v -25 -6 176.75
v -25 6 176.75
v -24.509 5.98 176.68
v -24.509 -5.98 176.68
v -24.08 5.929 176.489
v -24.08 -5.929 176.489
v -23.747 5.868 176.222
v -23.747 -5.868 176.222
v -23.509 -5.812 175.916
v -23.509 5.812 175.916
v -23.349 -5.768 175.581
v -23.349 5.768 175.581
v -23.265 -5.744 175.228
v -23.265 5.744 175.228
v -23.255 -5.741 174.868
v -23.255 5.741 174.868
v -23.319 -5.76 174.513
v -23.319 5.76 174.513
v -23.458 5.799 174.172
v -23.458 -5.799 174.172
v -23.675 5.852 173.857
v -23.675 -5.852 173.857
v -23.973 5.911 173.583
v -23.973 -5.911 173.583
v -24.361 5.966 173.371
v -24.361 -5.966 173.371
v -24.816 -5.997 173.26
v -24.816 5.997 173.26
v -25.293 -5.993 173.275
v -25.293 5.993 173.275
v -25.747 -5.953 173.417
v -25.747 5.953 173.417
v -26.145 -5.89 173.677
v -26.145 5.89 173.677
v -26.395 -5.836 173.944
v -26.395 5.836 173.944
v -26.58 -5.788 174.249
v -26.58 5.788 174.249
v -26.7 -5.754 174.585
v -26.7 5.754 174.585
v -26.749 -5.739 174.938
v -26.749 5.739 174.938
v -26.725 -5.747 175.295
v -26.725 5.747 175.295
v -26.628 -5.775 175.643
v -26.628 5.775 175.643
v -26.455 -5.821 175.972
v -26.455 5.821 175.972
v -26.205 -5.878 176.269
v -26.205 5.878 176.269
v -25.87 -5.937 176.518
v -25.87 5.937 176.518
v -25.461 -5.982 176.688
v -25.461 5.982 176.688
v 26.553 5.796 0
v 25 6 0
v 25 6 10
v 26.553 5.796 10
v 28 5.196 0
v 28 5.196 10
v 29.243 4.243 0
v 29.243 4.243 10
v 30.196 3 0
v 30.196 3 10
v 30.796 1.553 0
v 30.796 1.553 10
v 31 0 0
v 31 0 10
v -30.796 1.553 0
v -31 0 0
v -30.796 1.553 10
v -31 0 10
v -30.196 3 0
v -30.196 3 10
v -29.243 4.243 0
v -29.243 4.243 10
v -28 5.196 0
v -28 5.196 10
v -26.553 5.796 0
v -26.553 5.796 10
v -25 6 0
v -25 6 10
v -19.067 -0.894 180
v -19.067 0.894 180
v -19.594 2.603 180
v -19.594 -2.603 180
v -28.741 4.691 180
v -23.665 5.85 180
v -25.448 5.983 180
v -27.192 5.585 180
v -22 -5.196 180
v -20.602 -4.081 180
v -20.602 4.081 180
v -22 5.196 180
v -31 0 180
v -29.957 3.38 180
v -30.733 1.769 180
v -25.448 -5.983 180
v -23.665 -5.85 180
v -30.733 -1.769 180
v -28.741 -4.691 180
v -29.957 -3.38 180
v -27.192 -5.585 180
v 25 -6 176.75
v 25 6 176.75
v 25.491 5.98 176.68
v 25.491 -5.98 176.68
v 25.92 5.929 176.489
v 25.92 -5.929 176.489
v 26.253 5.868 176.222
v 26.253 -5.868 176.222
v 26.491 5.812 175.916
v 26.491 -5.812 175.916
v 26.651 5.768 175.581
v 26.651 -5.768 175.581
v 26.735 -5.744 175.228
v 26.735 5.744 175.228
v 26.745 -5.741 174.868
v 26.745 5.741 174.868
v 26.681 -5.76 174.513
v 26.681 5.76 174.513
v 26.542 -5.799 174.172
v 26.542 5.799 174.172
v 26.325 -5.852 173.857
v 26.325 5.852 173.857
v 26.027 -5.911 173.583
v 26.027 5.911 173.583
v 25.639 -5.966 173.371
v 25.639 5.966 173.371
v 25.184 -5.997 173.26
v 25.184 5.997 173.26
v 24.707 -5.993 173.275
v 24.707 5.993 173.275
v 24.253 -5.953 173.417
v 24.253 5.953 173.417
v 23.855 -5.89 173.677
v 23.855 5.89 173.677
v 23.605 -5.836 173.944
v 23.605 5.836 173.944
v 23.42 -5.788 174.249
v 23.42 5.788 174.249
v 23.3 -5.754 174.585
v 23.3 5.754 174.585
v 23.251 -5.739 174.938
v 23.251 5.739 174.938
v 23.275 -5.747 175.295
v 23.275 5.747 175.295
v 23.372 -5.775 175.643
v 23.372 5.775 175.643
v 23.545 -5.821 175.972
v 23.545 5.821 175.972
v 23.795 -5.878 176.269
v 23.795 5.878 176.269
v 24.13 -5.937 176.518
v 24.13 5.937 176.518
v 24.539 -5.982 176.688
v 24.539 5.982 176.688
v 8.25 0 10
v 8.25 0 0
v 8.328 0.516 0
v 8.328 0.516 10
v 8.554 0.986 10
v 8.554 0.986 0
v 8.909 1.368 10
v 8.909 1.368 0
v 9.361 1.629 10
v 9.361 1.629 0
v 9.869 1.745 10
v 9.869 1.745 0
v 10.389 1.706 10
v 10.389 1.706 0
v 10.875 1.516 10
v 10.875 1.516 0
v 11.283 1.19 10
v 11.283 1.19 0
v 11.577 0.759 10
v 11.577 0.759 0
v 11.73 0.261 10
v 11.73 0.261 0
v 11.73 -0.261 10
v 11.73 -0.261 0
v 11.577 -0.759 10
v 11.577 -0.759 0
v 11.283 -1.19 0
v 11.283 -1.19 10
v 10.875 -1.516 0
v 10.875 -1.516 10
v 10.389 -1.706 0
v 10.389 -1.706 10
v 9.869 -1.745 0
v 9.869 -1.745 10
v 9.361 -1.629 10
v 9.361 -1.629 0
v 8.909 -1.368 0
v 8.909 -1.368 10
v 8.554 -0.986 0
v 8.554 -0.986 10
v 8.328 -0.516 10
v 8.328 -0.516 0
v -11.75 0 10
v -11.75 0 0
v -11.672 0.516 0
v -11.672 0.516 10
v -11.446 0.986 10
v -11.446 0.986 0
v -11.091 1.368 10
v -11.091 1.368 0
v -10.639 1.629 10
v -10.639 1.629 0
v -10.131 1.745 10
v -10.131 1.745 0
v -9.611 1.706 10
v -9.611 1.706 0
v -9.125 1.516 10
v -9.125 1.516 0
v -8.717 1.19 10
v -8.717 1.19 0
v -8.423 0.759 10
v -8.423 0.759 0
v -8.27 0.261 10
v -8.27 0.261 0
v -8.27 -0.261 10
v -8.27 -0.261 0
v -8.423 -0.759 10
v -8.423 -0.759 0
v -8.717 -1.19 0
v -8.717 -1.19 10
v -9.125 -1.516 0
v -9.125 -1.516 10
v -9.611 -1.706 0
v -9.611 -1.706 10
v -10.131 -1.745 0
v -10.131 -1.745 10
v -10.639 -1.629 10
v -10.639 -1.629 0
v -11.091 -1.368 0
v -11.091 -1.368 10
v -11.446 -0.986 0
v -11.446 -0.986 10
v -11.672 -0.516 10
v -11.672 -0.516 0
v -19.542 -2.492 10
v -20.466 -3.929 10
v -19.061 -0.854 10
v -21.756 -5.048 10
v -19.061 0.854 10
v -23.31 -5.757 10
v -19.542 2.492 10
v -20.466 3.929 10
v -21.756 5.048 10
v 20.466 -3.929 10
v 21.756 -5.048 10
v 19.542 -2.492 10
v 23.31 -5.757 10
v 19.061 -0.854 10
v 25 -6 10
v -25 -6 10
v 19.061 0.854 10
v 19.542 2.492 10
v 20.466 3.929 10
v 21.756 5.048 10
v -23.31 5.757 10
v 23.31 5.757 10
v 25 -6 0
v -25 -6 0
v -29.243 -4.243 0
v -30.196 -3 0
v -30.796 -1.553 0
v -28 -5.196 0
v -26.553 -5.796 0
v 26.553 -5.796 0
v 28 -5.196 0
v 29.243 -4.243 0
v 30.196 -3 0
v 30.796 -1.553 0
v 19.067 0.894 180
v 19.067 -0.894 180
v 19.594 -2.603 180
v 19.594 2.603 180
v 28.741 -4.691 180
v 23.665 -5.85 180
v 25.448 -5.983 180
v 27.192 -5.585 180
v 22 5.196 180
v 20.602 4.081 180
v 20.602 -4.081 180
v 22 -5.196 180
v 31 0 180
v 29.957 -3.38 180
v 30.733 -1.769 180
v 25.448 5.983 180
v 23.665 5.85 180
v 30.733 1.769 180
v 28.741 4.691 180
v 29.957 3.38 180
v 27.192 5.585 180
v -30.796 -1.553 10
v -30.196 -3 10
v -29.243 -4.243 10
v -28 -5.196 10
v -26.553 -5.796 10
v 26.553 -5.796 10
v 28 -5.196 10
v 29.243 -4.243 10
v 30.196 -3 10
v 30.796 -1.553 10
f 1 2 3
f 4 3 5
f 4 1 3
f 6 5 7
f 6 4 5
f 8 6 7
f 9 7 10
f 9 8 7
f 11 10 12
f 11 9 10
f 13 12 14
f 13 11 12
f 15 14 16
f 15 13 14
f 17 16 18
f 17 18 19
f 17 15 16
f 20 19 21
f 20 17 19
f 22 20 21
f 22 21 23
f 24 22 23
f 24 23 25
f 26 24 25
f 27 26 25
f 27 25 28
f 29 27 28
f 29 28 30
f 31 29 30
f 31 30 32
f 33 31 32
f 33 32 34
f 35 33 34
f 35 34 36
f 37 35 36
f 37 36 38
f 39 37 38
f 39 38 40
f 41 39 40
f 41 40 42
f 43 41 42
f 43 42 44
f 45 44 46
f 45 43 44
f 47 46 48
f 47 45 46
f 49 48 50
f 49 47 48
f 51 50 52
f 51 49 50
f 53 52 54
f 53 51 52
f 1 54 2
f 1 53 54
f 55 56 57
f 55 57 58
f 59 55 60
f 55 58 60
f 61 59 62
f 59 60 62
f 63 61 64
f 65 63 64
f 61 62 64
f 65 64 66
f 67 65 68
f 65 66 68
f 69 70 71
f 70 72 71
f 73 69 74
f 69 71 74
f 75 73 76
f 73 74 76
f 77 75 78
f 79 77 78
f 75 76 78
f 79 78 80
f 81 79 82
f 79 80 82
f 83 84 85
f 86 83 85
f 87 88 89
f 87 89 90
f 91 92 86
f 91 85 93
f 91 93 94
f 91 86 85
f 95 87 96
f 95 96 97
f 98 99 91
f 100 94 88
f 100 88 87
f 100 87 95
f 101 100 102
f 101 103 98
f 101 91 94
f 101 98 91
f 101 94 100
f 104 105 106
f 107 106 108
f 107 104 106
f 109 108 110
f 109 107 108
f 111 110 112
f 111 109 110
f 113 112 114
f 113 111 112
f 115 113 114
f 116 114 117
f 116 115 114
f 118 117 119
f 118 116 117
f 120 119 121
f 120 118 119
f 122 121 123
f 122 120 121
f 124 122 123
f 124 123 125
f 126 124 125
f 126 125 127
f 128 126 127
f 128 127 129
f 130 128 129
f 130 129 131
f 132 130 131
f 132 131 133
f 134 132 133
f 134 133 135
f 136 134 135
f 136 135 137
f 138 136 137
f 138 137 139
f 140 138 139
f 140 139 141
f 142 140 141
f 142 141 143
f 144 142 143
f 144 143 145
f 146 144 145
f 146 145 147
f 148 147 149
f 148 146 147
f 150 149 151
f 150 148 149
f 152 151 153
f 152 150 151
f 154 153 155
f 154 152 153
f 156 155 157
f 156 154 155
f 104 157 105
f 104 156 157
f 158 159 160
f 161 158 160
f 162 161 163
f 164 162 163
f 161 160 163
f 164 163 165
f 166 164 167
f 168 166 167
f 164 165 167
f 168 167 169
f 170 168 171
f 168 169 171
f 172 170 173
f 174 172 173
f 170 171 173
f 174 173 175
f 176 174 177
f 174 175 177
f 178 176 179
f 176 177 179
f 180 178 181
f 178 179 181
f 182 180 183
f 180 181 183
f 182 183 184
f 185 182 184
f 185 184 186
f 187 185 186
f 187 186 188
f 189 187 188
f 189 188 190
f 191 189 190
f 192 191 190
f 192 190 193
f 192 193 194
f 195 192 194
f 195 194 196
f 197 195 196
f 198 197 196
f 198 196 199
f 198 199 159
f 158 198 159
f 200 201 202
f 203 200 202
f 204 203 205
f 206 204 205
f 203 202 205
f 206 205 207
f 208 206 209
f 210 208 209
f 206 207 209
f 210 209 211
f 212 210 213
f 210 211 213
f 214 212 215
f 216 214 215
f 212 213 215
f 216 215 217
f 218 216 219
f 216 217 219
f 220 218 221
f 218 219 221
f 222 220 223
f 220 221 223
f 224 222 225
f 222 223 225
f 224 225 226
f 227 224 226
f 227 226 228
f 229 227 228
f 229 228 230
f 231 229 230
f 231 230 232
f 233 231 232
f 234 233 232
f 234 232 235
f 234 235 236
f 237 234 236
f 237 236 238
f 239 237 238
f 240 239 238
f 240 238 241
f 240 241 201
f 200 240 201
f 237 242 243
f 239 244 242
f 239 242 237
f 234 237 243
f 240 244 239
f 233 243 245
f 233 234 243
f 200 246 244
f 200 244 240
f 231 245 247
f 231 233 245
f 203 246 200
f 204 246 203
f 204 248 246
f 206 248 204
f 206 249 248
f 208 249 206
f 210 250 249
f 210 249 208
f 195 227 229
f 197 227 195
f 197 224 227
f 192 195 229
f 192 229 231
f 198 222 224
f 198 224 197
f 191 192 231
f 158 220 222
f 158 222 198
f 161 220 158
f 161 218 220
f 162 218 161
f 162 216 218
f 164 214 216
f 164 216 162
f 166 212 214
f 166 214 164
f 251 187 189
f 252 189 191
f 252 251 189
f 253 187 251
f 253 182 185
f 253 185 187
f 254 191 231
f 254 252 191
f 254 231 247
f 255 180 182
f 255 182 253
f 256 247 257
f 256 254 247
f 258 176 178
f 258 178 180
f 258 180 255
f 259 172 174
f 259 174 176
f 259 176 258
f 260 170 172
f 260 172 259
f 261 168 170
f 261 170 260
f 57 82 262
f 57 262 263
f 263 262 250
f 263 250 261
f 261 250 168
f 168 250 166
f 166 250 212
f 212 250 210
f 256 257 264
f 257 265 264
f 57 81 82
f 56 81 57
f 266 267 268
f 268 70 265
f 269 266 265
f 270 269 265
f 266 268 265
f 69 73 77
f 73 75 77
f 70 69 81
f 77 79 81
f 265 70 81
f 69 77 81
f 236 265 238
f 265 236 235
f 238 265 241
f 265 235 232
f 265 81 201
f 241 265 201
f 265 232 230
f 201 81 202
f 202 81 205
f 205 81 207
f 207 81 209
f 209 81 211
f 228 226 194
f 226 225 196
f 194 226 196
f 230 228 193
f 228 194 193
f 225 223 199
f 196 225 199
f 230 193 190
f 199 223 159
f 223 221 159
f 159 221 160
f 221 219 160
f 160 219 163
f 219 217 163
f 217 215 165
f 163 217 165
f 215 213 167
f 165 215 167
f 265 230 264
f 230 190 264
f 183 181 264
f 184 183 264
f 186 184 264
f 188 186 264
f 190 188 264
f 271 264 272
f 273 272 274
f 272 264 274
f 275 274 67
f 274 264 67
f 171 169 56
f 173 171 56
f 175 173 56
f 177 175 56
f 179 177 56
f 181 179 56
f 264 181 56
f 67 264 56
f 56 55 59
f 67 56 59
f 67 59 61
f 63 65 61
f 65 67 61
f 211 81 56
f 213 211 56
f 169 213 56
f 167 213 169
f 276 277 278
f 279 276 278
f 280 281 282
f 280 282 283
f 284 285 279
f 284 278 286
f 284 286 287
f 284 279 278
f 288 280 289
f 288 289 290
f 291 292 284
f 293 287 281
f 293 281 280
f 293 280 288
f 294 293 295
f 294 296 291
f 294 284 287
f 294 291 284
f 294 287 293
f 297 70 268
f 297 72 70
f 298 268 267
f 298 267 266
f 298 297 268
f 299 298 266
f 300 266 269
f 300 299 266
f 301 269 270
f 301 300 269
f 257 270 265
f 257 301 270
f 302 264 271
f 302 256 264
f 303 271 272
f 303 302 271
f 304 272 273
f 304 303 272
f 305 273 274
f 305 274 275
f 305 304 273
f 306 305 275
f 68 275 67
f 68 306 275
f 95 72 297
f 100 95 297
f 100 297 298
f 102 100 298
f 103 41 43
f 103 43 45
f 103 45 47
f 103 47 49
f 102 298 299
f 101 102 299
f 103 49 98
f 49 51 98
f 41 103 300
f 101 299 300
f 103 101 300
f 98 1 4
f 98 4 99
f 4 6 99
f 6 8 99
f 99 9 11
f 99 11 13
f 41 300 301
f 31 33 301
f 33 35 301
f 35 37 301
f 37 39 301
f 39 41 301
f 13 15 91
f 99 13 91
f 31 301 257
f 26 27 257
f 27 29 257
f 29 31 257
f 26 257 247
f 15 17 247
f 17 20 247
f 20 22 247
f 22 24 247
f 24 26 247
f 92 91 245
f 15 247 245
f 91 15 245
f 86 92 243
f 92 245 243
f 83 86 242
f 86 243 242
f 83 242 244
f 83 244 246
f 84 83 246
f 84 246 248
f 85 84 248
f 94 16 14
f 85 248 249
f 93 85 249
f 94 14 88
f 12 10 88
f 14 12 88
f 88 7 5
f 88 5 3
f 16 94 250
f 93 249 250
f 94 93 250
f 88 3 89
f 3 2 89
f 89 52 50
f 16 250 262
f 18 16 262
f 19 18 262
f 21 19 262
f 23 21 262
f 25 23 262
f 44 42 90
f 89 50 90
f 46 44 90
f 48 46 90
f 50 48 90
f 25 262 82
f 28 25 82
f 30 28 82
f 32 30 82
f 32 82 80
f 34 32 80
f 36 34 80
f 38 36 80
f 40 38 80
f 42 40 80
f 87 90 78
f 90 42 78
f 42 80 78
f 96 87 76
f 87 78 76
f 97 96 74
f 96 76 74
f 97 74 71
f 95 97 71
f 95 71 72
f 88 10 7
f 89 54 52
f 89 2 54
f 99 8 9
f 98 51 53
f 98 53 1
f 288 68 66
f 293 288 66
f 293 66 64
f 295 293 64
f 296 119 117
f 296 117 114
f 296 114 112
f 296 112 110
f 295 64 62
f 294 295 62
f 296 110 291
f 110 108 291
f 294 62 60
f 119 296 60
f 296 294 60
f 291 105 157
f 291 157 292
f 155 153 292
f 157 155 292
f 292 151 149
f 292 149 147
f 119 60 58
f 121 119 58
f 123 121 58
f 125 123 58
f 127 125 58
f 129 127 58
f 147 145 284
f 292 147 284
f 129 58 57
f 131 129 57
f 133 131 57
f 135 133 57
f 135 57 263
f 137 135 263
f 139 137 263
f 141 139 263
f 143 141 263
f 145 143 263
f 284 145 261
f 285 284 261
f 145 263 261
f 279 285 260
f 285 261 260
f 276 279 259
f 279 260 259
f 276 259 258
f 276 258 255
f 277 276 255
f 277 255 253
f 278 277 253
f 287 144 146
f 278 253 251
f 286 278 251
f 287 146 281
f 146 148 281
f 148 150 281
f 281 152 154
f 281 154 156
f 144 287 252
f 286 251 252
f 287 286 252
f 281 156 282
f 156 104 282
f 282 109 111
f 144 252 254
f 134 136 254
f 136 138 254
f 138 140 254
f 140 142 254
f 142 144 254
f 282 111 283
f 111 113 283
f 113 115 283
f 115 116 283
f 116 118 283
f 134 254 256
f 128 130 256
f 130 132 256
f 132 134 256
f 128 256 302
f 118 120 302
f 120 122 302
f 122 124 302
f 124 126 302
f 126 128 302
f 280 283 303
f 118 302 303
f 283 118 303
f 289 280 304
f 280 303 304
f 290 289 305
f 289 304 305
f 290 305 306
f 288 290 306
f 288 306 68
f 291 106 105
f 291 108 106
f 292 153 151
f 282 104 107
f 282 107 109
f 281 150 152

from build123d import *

# Parameters (mm, degrees)
SKETCH1_W               = 62
SKETCH1_H               = 12
BOSS_EXTRUDE1_DEPTH     = 10
SKETCH2_R               = 6
BOSS_EXTRUDE2_DEPTH     = 170
FILLET1_R               = 6
CUT_EXTRUDE3_DEPTH      = 183.748461006
CUT_EXTRUDE3_DEPTH_BACK = 183.748461006
SKETCH6_R               = 1.75
CUT_EXTRUDE4_REACH      = 184.748
SKETCH7_R               = 1.75


with BuildPart() as part:
    # Sketch1 → Boss-Extrude1 (new body)
    with BuildSketch(Plane.XY):
        Rectangle(SKETCH1_W, SKETCH1_H)
    extrude(amount=BOSS_EXTRUDE1_DEPTH)

    # Sketch2 → Boss-Extrude2 (add)
    with BuildSketch(Plane.XY.offset(10)):
        with Locations(Location((-25, 0, 0), (0, 0, 180))):
            Circle(SKETCH2_R)
        with Locations((25, 0)):
            Circle(SKETCH2_R)
    extrude(amount=BOSS_EXTRUDE2_DEPTH)

    # Fillet1
    fillet1_edges = [part.edges().sort_by_distance(p)[0] for p in [
        (-31, -6, 5),
        (-31, 6, 5),
        (31, 6, 5),
        (31, -6, 5),
    ]]
    fillet(fillet1_edges, radius=FILLET1_R - 0.0001)  # a hair under: the kernel refuses the full size

    # Sketch6 → Cut-Extrude3 (cut, two sides: drawn at the far end of the back side and taken through both)
    with BuildSketch(Plane(origin=(0, 0, 0), x_dir=(1, 0, 0), z_dir=(0, 1, 0)).offset(-CUT_EXTRUDE3_DEPTH_BACK)):
        with Locations(Location((-25, -175, 0), (0, 0, 270))):
            Circle(SKETCH6_R)
        with Locations(Location((25, -175, 0), (0, 0, 270))):
            Circle(SKETCH6_R)
    extrude(amount=CUT_EXTRUDE3_DEPTH + CUT_EXTRUDE3_DEPTH_BACK, mode=Mode.SUBTRACT)

    # Sketch7 → Cut-Extrude4 (cut, up to next)
    with BuildSketch(Plane(origin=(0, 0, 0), x_dir=(-1, 0, 0), z_dir=(0, 0, -1)), mode=Mode.PRIVATE) as cut_extrude4_sk1:
        with Locations((-10, 0)):
            Circle(SKETCH7_R)
    cut_extrude4_tool1 = extrude(cut_extrude4_sk1.sketch, amount=-CUT_EXTRUDE4_REACH, mode=Mode.PRIVATE) & part.part
    # Sketch7 → Cut-Extrude4 (cut, up to next)
    with BuildSketch(Plane(origin=(0, 0, 0), x_dir=(-1, 0, 0), z_dir=(0, 0, -1)), mode=Mode.PRIVATE) as cut_extrude4_sk2:
        with Locations((10, 0)):
            Circle(SKETCH7_R)
    cut_extrude4_tool2 = extrude(cut_extrude4_sk2.sketch, amount=-CUT_EXTRUDE4_REACH, mode=Mode.PRIVATE) & part.part
    add(cut_extrude4_tool1.solids().sort_by_distance((10, 0, 0))[0], mode=Mode.SUBTRACT)
    add(cut_extrude4_tool2.solids().sort_by_distance((-10, 0, 0))[0], mode=Mode.SUBTRACT)


solid = part.part
